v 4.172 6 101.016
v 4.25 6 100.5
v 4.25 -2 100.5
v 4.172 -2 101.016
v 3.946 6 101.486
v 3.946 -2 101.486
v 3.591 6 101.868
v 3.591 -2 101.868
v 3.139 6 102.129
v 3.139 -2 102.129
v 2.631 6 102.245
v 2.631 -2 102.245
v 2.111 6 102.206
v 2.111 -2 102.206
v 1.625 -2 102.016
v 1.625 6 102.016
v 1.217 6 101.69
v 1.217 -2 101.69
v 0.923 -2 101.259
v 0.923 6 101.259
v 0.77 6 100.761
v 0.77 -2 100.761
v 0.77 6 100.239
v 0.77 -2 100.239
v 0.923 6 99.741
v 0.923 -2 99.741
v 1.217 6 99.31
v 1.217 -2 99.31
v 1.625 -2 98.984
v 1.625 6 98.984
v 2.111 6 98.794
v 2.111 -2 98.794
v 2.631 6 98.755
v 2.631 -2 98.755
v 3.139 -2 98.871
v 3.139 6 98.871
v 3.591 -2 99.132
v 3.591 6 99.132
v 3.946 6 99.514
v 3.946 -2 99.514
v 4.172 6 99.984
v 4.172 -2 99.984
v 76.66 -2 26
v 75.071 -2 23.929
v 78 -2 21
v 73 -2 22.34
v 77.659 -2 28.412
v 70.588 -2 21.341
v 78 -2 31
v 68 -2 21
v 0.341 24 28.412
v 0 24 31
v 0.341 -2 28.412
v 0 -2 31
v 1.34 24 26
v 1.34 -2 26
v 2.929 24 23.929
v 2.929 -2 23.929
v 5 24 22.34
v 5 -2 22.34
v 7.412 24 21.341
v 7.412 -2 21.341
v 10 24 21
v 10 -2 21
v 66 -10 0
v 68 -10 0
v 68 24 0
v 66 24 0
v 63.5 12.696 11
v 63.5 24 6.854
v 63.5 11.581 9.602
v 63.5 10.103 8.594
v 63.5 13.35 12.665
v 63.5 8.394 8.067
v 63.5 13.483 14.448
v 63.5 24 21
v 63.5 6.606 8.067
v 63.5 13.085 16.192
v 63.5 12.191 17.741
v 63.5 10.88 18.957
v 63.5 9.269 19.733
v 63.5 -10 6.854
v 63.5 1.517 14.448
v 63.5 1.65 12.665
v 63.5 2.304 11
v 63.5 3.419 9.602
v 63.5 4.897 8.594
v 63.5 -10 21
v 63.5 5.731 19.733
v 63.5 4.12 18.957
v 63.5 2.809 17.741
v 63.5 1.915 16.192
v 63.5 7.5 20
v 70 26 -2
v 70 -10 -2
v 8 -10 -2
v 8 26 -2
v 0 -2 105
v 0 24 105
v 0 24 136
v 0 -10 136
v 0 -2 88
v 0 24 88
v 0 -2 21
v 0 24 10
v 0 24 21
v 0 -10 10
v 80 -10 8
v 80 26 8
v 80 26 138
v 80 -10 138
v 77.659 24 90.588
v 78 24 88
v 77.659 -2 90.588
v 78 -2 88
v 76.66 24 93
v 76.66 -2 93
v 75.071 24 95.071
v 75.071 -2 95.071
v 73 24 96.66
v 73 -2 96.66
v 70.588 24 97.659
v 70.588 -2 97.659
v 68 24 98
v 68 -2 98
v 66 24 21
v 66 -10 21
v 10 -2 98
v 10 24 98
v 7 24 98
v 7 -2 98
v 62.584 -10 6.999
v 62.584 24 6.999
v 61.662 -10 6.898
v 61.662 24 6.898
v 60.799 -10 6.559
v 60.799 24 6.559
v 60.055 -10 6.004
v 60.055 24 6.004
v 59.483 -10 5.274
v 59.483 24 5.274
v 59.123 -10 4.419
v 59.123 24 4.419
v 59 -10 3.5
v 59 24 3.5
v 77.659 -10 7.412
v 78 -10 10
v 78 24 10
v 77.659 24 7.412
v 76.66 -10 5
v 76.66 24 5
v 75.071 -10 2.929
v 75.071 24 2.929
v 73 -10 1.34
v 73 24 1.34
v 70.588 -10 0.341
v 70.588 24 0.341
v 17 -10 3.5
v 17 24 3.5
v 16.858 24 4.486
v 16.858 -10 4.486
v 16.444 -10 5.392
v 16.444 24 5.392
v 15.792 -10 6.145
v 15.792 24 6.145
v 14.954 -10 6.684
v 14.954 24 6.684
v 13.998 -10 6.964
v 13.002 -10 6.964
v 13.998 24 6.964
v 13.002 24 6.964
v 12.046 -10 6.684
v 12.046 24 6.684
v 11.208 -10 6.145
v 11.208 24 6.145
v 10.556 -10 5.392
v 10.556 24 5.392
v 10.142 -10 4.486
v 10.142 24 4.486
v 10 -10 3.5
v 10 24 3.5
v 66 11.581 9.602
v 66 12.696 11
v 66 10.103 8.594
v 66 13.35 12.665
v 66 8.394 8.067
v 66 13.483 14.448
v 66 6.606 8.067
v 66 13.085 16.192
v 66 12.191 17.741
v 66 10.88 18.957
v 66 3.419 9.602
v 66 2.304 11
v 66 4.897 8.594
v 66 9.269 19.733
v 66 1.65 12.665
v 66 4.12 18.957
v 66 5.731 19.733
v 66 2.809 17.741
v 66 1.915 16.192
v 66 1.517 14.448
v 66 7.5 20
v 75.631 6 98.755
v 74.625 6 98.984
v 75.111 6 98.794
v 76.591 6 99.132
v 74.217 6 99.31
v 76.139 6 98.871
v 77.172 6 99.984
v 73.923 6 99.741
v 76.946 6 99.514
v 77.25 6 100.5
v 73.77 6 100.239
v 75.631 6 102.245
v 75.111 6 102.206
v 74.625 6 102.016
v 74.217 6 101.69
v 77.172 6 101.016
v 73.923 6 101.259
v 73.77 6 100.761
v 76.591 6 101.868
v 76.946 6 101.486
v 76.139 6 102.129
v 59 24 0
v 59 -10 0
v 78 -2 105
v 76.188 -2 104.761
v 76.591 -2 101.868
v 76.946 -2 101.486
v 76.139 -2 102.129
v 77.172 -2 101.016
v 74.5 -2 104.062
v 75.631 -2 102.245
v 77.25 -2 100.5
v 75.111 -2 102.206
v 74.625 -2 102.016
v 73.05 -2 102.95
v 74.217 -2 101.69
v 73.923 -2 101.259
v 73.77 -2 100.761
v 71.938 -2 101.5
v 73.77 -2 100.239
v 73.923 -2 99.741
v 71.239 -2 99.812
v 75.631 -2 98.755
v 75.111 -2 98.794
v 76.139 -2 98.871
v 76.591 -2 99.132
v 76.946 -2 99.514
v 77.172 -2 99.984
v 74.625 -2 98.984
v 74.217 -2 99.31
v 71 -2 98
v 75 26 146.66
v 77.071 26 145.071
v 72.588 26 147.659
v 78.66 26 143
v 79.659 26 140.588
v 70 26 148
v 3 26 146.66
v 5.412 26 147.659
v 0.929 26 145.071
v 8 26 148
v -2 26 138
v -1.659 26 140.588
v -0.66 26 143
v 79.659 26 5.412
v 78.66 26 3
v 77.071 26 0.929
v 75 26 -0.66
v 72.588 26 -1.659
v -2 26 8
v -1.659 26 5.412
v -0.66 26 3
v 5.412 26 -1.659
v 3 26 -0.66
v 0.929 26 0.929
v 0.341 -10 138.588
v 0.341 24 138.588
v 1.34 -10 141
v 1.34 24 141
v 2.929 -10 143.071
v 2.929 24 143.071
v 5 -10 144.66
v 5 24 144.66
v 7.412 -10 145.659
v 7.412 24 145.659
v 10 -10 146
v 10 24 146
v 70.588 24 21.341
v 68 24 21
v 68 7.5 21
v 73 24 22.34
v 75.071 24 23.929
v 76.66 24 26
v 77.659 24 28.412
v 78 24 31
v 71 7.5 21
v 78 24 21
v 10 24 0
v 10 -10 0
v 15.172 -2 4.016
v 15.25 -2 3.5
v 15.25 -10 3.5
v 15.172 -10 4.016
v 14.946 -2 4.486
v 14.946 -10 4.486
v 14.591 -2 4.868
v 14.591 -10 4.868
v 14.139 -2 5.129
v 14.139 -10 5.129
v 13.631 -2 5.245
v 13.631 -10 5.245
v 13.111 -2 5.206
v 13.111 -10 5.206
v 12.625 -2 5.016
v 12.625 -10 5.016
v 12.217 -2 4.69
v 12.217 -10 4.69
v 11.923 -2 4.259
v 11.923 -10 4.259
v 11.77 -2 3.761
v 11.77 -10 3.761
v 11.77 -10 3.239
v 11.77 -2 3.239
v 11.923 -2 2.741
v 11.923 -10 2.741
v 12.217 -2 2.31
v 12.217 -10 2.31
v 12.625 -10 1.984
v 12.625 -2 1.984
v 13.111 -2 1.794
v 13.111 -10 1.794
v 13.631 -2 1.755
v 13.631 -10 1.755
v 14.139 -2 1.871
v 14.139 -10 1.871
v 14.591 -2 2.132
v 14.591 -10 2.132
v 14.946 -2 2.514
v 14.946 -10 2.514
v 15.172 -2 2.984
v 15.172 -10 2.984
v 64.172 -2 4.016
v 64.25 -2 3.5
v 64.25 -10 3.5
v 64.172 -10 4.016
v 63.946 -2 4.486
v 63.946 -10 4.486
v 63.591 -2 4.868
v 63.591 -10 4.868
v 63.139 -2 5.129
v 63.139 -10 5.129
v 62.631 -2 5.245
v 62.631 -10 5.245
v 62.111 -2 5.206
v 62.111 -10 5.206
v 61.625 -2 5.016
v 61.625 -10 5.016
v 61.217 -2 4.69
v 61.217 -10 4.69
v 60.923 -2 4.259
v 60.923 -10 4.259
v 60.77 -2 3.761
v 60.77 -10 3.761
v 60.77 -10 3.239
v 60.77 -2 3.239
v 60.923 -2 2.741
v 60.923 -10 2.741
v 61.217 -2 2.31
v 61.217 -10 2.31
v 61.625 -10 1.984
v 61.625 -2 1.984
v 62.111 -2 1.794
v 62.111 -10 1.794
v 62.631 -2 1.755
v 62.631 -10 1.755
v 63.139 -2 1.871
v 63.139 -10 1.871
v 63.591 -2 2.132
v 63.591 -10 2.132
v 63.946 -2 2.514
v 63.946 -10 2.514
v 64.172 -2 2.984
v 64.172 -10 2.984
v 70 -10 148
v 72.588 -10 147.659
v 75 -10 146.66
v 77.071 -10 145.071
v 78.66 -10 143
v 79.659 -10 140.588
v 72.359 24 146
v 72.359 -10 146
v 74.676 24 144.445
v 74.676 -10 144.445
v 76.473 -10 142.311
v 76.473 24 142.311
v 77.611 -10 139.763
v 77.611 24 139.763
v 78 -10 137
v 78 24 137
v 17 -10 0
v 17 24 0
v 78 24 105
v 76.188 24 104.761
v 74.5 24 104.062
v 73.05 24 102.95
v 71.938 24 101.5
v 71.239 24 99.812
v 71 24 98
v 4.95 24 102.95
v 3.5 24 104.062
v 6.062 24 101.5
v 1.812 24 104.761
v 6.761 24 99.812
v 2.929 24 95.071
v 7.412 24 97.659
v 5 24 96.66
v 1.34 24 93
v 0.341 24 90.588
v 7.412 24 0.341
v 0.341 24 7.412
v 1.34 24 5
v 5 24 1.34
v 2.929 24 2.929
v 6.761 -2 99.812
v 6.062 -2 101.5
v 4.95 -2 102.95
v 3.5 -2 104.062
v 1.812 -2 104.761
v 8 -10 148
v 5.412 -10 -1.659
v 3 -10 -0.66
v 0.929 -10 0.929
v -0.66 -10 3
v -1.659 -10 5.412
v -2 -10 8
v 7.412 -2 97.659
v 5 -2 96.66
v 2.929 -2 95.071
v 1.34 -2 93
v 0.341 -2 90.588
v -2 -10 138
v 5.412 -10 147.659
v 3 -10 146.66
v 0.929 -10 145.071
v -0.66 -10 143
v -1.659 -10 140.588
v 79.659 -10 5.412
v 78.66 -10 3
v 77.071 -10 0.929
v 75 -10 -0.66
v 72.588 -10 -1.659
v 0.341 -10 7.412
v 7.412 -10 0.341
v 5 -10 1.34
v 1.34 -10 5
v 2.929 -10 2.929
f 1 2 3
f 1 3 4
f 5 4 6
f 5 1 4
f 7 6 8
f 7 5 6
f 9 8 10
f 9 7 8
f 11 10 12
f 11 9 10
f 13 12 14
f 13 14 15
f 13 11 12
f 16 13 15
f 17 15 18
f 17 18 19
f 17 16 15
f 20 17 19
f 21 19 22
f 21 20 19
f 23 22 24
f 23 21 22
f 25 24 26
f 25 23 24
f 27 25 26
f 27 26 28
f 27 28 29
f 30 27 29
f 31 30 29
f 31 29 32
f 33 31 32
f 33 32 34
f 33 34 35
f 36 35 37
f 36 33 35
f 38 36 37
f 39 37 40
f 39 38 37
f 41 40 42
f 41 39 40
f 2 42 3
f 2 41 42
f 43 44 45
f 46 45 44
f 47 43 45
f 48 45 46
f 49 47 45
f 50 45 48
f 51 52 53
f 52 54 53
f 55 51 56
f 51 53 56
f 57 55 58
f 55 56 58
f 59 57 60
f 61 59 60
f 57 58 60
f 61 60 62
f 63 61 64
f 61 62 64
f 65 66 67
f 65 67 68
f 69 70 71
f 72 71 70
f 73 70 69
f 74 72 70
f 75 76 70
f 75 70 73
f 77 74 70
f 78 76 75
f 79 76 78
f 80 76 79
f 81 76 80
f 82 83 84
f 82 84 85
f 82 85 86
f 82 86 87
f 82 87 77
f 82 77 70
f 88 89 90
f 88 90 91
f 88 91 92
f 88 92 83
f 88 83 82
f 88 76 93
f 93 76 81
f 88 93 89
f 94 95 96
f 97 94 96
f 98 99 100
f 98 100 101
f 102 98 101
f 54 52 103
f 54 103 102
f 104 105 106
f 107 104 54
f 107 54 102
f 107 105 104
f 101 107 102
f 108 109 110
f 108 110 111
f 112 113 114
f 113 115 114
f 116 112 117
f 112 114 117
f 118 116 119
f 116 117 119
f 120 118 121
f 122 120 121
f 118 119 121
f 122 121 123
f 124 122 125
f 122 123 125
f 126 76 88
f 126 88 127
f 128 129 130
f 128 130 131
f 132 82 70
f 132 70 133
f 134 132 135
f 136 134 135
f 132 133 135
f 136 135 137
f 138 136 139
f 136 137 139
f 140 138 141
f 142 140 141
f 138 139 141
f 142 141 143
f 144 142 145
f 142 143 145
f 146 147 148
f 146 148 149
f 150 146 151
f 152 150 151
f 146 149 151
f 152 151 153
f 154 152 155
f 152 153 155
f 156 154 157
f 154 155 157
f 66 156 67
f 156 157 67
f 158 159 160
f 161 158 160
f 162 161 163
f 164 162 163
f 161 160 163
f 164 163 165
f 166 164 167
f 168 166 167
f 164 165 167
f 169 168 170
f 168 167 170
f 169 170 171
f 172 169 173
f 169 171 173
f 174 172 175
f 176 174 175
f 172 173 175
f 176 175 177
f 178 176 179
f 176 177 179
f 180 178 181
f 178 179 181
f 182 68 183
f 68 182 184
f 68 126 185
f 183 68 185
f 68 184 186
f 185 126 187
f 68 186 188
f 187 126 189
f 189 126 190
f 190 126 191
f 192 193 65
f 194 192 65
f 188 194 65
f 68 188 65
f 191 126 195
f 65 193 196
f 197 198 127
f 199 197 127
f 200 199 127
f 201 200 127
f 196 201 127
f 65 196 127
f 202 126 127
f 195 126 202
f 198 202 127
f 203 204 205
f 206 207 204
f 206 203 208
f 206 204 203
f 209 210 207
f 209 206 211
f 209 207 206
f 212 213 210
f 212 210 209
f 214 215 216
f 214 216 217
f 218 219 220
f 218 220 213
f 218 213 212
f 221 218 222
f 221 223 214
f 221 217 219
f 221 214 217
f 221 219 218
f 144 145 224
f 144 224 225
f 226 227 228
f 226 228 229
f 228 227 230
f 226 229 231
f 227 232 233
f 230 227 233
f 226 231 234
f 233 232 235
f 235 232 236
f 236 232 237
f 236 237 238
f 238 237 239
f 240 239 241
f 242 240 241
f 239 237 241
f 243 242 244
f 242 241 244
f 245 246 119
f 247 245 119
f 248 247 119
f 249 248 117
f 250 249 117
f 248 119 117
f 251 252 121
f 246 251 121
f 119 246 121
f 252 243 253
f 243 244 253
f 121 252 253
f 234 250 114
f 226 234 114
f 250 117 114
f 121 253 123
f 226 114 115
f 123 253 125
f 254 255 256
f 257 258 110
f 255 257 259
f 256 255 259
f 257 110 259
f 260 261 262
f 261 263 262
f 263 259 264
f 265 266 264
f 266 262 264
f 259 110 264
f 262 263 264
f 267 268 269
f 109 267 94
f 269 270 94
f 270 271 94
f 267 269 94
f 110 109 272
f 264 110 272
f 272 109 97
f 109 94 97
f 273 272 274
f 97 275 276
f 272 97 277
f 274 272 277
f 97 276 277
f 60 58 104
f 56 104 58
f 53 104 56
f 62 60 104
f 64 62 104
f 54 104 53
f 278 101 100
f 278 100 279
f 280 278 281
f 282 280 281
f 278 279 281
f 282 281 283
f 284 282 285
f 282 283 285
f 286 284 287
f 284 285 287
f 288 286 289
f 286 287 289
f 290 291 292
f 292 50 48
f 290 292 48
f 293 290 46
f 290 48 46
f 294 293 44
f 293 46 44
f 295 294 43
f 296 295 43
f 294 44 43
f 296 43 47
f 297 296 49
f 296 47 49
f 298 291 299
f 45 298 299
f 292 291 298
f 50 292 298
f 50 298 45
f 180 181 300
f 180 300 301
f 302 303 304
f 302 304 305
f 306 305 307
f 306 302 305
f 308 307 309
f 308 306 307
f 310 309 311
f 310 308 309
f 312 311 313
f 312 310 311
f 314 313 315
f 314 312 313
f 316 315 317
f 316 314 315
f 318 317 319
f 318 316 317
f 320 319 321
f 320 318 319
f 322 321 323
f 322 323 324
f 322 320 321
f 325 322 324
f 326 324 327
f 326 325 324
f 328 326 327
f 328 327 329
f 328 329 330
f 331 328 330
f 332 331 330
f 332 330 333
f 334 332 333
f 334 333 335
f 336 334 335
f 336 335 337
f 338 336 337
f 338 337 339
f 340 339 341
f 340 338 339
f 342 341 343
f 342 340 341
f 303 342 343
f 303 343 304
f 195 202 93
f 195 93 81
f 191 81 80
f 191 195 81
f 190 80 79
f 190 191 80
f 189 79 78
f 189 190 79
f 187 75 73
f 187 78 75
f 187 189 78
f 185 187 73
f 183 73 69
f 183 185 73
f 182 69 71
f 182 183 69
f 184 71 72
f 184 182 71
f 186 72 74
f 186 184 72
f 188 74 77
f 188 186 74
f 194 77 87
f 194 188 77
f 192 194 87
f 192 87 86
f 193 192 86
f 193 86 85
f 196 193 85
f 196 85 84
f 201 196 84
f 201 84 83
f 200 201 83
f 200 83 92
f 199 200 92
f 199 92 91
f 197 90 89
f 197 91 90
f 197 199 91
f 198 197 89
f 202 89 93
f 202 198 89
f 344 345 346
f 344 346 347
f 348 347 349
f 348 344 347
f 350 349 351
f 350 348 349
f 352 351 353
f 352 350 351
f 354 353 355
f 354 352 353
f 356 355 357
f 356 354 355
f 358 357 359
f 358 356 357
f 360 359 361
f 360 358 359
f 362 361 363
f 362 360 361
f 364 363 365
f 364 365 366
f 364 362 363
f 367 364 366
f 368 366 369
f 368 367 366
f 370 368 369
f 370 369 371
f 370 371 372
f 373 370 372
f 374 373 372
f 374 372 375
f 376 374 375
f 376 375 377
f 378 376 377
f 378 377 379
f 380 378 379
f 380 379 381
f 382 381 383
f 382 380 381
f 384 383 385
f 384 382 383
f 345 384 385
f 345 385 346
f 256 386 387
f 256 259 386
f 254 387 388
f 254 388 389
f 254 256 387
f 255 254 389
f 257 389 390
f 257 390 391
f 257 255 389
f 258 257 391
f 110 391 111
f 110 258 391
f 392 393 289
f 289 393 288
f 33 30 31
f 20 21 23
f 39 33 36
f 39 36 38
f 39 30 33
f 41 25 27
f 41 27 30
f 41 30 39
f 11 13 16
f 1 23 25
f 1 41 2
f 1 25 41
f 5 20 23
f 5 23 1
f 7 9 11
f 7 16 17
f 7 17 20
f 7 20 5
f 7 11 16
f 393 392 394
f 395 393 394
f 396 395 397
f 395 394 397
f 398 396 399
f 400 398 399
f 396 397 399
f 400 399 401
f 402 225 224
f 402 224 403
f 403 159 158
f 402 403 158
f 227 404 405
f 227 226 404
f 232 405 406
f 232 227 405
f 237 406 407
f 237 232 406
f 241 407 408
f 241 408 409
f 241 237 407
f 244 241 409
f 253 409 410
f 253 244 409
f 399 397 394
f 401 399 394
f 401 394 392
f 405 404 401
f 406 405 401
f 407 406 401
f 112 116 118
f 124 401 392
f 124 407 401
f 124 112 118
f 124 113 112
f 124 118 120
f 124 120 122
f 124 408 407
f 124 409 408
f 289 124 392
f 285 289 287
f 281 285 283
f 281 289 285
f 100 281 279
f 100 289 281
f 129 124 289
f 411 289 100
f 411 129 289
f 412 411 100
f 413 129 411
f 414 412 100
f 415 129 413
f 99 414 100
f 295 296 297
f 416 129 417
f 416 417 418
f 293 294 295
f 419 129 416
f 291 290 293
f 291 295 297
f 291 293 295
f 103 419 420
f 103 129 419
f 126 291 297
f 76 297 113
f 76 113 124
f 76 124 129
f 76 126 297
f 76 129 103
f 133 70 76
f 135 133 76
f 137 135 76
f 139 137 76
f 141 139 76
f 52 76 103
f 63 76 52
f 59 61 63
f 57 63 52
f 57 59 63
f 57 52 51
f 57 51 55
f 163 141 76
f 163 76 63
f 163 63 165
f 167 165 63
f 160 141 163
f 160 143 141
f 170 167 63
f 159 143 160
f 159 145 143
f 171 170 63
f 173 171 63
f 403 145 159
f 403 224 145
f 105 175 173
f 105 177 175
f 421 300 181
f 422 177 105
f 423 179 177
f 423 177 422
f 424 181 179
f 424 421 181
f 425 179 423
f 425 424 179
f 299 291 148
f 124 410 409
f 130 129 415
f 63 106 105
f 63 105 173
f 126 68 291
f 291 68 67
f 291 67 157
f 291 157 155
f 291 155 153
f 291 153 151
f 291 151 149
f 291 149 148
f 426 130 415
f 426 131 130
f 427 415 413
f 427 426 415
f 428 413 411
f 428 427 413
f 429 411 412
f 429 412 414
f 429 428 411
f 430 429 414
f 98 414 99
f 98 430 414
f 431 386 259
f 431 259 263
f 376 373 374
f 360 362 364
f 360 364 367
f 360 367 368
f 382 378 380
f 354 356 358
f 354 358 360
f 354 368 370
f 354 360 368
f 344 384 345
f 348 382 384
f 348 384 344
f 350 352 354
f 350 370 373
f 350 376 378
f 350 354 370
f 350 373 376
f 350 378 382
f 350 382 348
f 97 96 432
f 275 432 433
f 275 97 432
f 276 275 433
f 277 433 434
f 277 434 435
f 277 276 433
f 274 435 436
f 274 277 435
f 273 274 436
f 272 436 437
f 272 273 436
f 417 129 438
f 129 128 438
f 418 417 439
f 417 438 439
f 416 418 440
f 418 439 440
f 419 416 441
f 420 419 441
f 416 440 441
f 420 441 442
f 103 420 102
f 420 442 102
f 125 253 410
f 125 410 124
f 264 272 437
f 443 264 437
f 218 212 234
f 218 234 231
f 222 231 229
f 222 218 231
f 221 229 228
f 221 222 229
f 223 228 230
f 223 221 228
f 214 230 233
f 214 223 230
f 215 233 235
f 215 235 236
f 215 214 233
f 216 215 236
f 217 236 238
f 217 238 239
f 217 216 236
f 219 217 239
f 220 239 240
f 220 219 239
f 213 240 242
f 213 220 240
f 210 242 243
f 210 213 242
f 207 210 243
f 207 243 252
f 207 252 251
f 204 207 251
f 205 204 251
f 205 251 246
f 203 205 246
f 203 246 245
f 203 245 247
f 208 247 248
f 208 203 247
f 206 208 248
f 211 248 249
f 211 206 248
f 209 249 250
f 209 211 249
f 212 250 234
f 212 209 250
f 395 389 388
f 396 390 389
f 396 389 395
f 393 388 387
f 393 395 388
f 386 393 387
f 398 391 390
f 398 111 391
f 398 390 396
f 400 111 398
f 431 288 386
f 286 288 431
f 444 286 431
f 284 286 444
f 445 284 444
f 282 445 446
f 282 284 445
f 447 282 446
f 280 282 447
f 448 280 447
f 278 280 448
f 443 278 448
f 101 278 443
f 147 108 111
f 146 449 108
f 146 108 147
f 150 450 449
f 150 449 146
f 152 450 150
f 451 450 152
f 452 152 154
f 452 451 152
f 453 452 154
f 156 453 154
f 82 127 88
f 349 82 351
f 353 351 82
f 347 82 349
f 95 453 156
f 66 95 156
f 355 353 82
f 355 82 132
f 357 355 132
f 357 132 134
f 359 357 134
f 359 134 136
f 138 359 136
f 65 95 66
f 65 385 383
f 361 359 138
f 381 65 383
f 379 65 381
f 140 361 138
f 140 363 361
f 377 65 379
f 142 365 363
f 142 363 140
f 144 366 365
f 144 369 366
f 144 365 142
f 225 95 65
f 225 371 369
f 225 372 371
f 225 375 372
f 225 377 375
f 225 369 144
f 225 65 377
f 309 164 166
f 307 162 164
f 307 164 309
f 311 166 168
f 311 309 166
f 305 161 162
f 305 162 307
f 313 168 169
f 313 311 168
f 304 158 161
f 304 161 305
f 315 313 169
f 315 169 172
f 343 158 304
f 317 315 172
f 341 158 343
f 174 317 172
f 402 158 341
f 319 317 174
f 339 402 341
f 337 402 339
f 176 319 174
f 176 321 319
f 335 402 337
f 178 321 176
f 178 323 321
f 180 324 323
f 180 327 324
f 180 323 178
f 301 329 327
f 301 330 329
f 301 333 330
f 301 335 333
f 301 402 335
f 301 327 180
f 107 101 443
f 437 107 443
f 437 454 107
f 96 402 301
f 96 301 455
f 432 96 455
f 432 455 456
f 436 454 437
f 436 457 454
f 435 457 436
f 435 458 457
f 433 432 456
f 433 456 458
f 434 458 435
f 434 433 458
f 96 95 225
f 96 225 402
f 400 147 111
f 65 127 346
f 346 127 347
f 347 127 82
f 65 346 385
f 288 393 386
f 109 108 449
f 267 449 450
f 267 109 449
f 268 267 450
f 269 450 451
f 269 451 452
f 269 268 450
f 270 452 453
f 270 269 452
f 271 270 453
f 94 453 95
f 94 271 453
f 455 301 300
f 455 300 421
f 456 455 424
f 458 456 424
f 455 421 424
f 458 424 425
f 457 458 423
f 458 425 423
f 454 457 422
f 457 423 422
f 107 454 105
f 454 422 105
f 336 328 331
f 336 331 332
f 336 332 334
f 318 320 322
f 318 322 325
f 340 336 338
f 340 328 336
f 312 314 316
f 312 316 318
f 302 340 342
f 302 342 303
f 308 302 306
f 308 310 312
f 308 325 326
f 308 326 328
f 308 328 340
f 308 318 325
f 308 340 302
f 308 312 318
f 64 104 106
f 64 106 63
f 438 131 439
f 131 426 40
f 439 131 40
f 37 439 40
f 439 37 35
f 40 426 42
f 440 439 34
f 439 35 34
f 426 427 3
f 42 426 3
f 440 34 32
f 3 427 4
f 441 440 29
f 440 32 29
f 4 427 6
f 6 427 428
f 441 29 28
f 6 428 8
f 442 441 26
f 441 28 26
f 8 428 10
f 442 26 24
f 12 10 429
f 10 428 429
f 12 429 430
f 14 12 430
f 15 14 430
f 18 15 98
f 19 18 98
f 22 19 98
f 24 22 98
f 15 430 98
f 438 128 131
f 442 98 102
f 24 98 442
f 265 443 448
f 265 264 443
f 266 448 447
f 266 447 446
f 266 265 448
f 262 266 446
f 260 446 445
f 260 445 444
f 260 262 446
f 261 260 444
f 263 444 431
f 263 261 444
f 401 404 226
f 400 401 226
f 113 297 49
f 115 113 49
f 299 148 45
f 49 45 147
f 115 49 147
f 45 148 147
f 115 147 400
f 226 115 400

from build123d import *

# Parameters (mm, degrees)
CYLINDER030_R             = 1.75
CYLINDER030_DEPTH         = 8
CYLINDER029_R             = 1.75
CYLINDER029_DEPTH         = 8
CYLINDER027_W             = 7
CYLINDER027_H             = 26
CYLINDER027_ANGLE         = 90
CYLINDER028_W             = 7
CYLINDER028_H             = 26
CYLINDER028_ANGLE         = 90
CYLINDER022_R             = 1.75
CYLINDER022_DEPTH         = 8
CYLINDER026_R             = 7
CYLINDER026_DEPTH         = 5
CYLINDER025_R             = 6
CYLINDER025_DEPTH         = 20
FUSION007_PLACEMENT_ANGLE = 270
CYLINDER024_R             = 1.75
CYLINDER024_DEPTH         = 8
CYLINDER023_R             = 3.5
CYLINDER023_DEPTH         = 34
BOX022_W                  = 7
BOX022_H                  = 34
BOX022_DEPTH              = 3.5
BOX023_W                  = 7
BOX023_H                  = 34
BOX023_DEPTH              = 3.5
BOX024_W                  = 2.5
BOX024_H                  = 34
BOX024_DEPTH              = 17.5
CYLINDER017_W             = 10
CYLINDER017_H             = 26
CYLINDER017_ANGLE         = 90
BOX018_W                  = 10
BOX018_H                  = 26
BOX018_DEPTH              = 10
CUT018_PLACEMENT_ANGLE    = 180
CYLINDER018_W             = 10
CYLINDER018_H             = 26
CYLINDER018_ANGLE         = 90
BOX019_W                  = 10
BOX019_H                  = 26
BOX019_DEPTH              = 10
CUT019_PLACEMENT_ANGLE    = 270
CYLINDER019_W             = 10
CYLINDER019_H             = 26
CYLINDER019_ANGLE         = 90
BOX020_W                  = 10
BOX020_H                  = 26
BOX020_DEPTH              = 10
CYLINDER020_W             = 10
CYLINDER020_H             = 26
CYLINDER020_ANGLE         = 90
BOX021_W                  = 10
BOX021_H                  = 26
BOX021_DEPTH              = 10
CUT021_PLACEMENT_ANGLE    = 270
CYLINDER014_W             = 10
CYLINDER014_H             = 34
CYLINDER014_ANGLE         = 90
BOX015_W                  = 10
BOX015_H                  = 34
BOX015_DEPTH              = 10
CUT013_PLACEMENT_ANGLE    = 180
CYLINDER015_W             = 10
CYLINDER015_H             = 34
CYLINDER015_ANGLE         = 90
BOX016_W                  = 10
BOX016_H                  = 34
BOX016_DEPTH              = 10
CUT014_PLACEMENT_ANGLE    = 180
CYLINDER016_W             = 10
CYLINDER016_H             = 34
CYLINDER016_ANGLE         = 90
BOX017_W                  = 10
BOX017_H                  = 34
BOX017_DEPTH              = 10
CUT015_PITCH_ANGLE        = -90
CUT015_PLACEMENT_ANGLE    = 180
CYLINDER013_W             = 10
CYLINDER013_H             = 34
CYLINDER013_ANGLE         = 90
BOX013_W                  = 10
BOX013_H                  = 34
BOX013_DEPTH              = 10
CUT012_PITCH_ANGLE        = 90
CUT012_PLACEMENT_ANGLE    = -180
BOX014_W                  = 78
BOX014_H                  = 34
BOX014_DEPTH              = 146
CYLINDER009_W             = 10
CYLINDER009_H             = 36
CYLINDER009_ANGLE         = 90
BOX009_W                  = 10
BOX009_H                  = 36
BOX009_DEPTH              = 10
CUT007_PLACEMENT_ANGLE    = 180
CYLINDER010_W             = 10
CYLINDER010_H             = 36
CYLINDER010_ANGLE         = 90
BOX010_W                  = 10
BOX010_H                  = 36
BOX010_DEPTH              = 10
CUT008_PLACEMENT_ANGLE    = 180
CYLINDER011_W             = 10
CYLINDER011_H             = 36
CYLINDER011_ANGLE         = 90
BOX011_W                  = 10
BOX011_H                  = 36
BOX011_DEPTH              = 10
CUT009_PITCH_ANGLE        = -90
CUT009_PLACEMENT_ANGLE    = -180
CYLINDER008_W             = 10
CYLINDER008_H             = 36
CYLINDER008_ANGLE         = 90
BOX007_W                  = 10
BOX007_H                  = 36
BOX007_DEPTH              = 10
CUT006_PITCH_ANGLE        = 90
CUT006_PLACEMENT_ANGLE    = -180
BOX008_W                  = 82
BOX008_H                  = 36
BOX008_DEPTH              = 150
CYLINDER021_R             = 3.5
CYLINDER021_DEPTH         = 34


with BuildPart() as cylinder030:
    # Cylinder030 → Cylinder030 (new body)
    with BuildSketch(Plane(origin=(75.5, -2, 100.5), x_dir=(1, 0, 0), z_dir=(0, -1, 0))):
        Circle(CYLINDER030_R)
    extrude(amount=CYLINDER030_DEPTH)


with BuildPart() as basecuts001:
    # Cylinder029 → Cylinder029 (new body)
    with BuildSketch(Plane(origin=(2.5, -2, 100.5), x_dir=(1, 0, 0), z_dir=(0, -1, 0))):
        Circle(CYLINDER029_R)
    extrude(amount=CYLINDER029_DEPTH)

    # Fusion011: union Cylinder030
    add(cylinder030.part)


with BuildPart() as basecuts001_1:
    # Fusion011 placement: moved
    add(basecuts001.part.moved(Location((0, 8, 0))))


with BuildPart() as mainmounts:
    # Cylinder027 → Cylinder027 (revolve)
    with BuildSketch(Plane(origin=(0, 24, 98), x_dir=(1, 0, 0), z_dir=(0, 0, -1))):
        with Locations((3.5, 13)):
            Rectangle(CYLINDER027_W, CYLINDER027_H)
    revolve(axis=Axis((0, 24, 98), (0, -1, 0)), revolution_arc=CYLINDER027_ANGLE)


with BuildPart() as fusion012:
    # Cylinder028 → Cylinder028 (revolve)
    with BuildSketch(Plane(origin=(78, 24, 98), x_dir=(0, 0, 1), z_dir=(1, 0, 0))):
        with Locations((3.5, 13)):
            Rectangle(CYLINDER028_W, CYLINDER028_H)
    revolve(axis=Axis((78, 24, 98), (0, -1, 0)), revolution_arc=CYLINDER028_ANGLE)

    # Fusion012: union mainMounts
    add(mainmounts.part)


with BuildPart() as cylinder022:
    # Cylinder022 → Cylinder022 (new body)
    with BuildSketch(Plane(origin=(13.5, -2, 3.5), x_dir=(1, 0, 0), z_dir=(0, -1, 0))):
        Circle(CYLINDER022_R)
    extrude(amount=CYLINDER022_DEPTH)


with BuildPart() as cylinder026:
    # Cylinder026 → Cylinder026 (new body)
    with BuildSketch(Plane.XY):
        Circle(CYLINDER026_R)
    extrude(amount=CYLINDER026_DEPTH)


with BuildPart() as powerswitch:
    # Cylinder025 → Cylinder025 (new body)
    with BuildSketch(Plane.XY):
        Circle(CYLINDER025_R)
    extrude(amount=CYLINDER025_DEPTH)

    # Fusion007: union Cylinder026
    add(cylinder026.part)


with BuildPart() as powerswitch_1:
    # Fusion007 placement: moved
    add(powerswitch.part.moved(Location((71, 7.5, 14))).rotate(Axis((71, 7.5, 14), (0, 1, 0)), FUSION007_PLACEMENT_ANGLE))


with BuildPart() as basecuts:
    # Cylinder024 → Cylinder024 (new body)
    with BuildSketch(Plane(origin=(62.5, -2, 3.5), x_dir=(1, 0, 0), z_dir=(0, -1, 0))):
        Circle(CYLINDER024_R)
    extrude(amount=CYLINDER024_DEPTH)

    # Fusion010: union Cylinder022, powerSwitch
    add(cylinder022.part)
    add(powerswitch_1.part)


with BuildPart() as cylinder023:
    # Cylinder023 → Cylinder023 (new body)
    with BuildSketch(Plane(origin=(62.5, 24, 3.5), x_dir=(1, 0, 0), z_dir=(0, -1, 0))):
        Circle(CYLINDER023_R)
    extrude(amount=CYLINDER023_DEPTH)


with BuildPart() as cube017:
    # Box022 → Box022 (new body)
    with BuildSketch(Plane(origin=(10, 24, 3.5), x_dir=(1, 0, 0), z_dir=(0, 0, -1))):
        with Locations((3.5, 17)):
            Rectangle(BOX022_W, BOX022_H)
    extrude(amount=BOX022_DEPTH)


with BuildPart() as cube018:
    # Box023 → Box023 (new body)
    with BuildSketch(Plane(origin=(59, 24, 3.5), x_dir=(1, 0, 0), z_dir=(0, 0, -1))):
        with Locations((3.5, 17)):
            Rectangle(BOX023_W, BOX023_H)
    extrude(amount=BOX023_DEPTH)


with BuildPart() as cube019:
    # Box024 → Box024 (new body)
    with BuildSketch(Plane(origin=(63.5, 24, 21), x_dir=(1, 0, 0), z_dir=(0, 0, -1))):
        with Locations((1.25, 17)):
            Rectangle(BOX024_W, BOX024_H)
    extrude(amount=BOX024_DEPTH)


with BuildPart() as cylinder017:
    # Cylinder017 → Cylinder017 (revolve)
    with BuildSketch(Plane(origin=(0, 26, 0), x_dir=(1, 0, 0), z_dir=(0, 0, -1))):
        with Locations((5, 13)):
            Rectangle(CYLINDER017_W, CYLINDER017_H)
    revolve(axis=Axis((0, 26, 0), (0, -1, 0)), revolution_arc=CYLINDER017_ANGLE)


with BuildPart() as batterysupport:
    # Box018 → Box018 (new body)
    with BuildSketch(Plane(origin=(10, 26, 0), x_dir=(-1, 0, 0), z_dir=(0, 0, 1))):
        with Locations((5, 13)):
            Rectangle(BOX018_W, BOX018_H)
    extrude(amount=BOX018_DEPTH)

    # Cut018: cut Cylinder017
    add(cylinder017.part, mode=Mode.SUBTRACT)


with BuildPart() as batterysupport_1:
    # Cut018 placement: moved
    add(batterysupport.part.moved(Location((10, -2, 31))).rotate(Axis((10, -2, 31), (0, 1, 0)), CUT018_PLACEMENT_ANGLE))


with BuildPart() as cylinder018:
    # Cylinder018 → Cylinder018 (revolve)
    with BuildSketch(Plane(origin=(0, 26, 0), x_dir=(1, 0, 0), z_dir=(0, 0, -1))):
        with Locations((5, 13)):
            Rectangle(CYLINDER018_W, CYLINDER018_H)
    revolve(axis=Axis((0, 26, 0), (0, -1, 0)), revolution_arc=CYLINDER018_ANGLE)


with BuildPart() as batterysupport001:
    # Box019 → Box019 (new body)
    with BuildSketch(Plane(origin=(10, 26, 0), x_dir=(-1, 0, 0), z_dir=(0, 0, 1))):
        with Locations((5, 13)):
            Rectangle(BOX019_W, BOX019_H)
    extrude(amount=BOX019_DEPTH)

    # Cut019: cut Cylinder018
    add(cylinder018.part, mode=Mode.SUBTRACT)


with BuildPart() as batterysupport001_1:
    # Cut019 placement: moved
    add(batterysupport001.part.moved(Location((68, -2, 31))).rotate(Axis((68, -2, 31), (0, -1, 0)), CUT019_PLACEMENT_ANGLE))


with BuildPart() as cylinder019:
    # Cylinder019 → Cylinder019 (revolve)
    with BuildSketch(Plane(origin=(0, 26, 0), x_dir=(1, 0, 0), z_dir=(0, 0, -1))):
        with Locations((5, 13)):
            Rectangle(CYLINDER019_W, CYLINDER019_H)
    revolve(axis=Axis((0, 26, 0), (0, -1, 0)), revolution_arc=CYLINDER019_ANGLE)


with BuildPart() as batterysupport002:
    # Box020 → Box020 (new body)
    with BuildSketch(Plane(origin=(10, 26, 0), x_dir=(-1, 0, 0), z_dir=(0, 0, 1))):
        with Locations((5, 13)):
            Rectangle(BOX020_W, BOX020_H)
    extrude(amount=BOX020_DEPTH)

    # Cut020: cut Cylinder019
    add(cylinder019.part, mode=Mode.SUBTRACT)


with BuildPart() as batterysupport002_1:
    # Cut020 placement: moved
    add(batterysupport002.part.moved(Location((68, -2, 88))))


with BuildPart() as cylinder020:
    # Cylinder020 → Cylinder020 (revolve)
    with BuildSketch(Plane(origin=(0, 26, 0), x_dir=(1, 0, 0), z_dir=(0, 0, -1))):
        with Locations((5, 13)):
            Rectangle(CYLINDER020_W, CYLINDER020_H)
    revolve(axis=Axis((0, 26, 0), (0, -1, 0)), revolution_arc=CYLINDER020_ANGLE)


with BuildPart() as batterysupport003:
    # Box021 → Box021 (new body)
    with BuildSketch(Plane(origin=(10, 26, 0), x_dir=(-1, 0, 0), z_dir=(0, 0, 1))):
        with Locations((5, 13)):
            Rectangle(BOX021_W, BOX021_H)
    extrude(amount=BOX021_DEPTH)

    # Cut021: cut Cylinder020
    add(cylinder020.part, mode=Mode.SUBTRACT)


with BuildPart() as batterysupport003_1:
    # Cut021 placement: moved
    add(batterysupport003.part.moved(Location((10, -2, 88))).rotate(Axis((10, -2, 88), (0, 1, 0)), CUT021_PLACEMENT_ANGLE))


with BuildPart() as cylinder014:
    # Cylinder014 → Cylinder014 (revolve)
    with BuildSketch(Plane(origin=(0, 26, 0), x_dir=(1, 0, 0), z_dir=(0, 0, -1))):
        with Locations((5, 17)):
            Rectangle(CYLINDER014_W, CYLINDER014_H)
    revolve(axis=Axis((0, 26, 0), (0, -1, 0)), revolution_arc=CYLINDER014_ANGLE)


with BuildPart() as cut013:
    # Box015 → Box015 (new body)
    with BuildSketch(Plane(origin=(0, -8, 0), x_dir=(1, 0, 0), z_dir=(0, 0, 1))):
        with Locations((5, 17)):
            Rectangle(BOX015_W, BOX015_H)
    extrude(amount=BOX015_DEPTH)

    # Cut013: cut Cylinder014
    add(cylinder014.part, mode=Mode.SUBTRACT)


with BuildPart() as cut013_1:
    # Cut013 placement: moved
    add(cut013.part.moved(Location((70, 18, 8))).rotate(Axis((70, 18, 8), (1, 0, 0)), CUT013_PLACEMENT_ANGLE))


with BuildPart() as cylinder015:
    # Cylinder015 → Cylinder015 (revolve)
    with BuildSketch(Plane(origin=(0, 26, 0), x_dir=(1, 0, 0), z_dir=(0, 0, -1))):
        with Locations((5, 17)):
            Rectangle(CYLINDER015_W, CYLINDER015_H)
    revolve(axis=Axis((0, 26, 0), (0, -1, 0)), revolution_arc=CYLINDER015_ANGLE)


with BuildPart() as cut014:
    # Box016 → Box016 (new body)
    with BuildSketch(Plane(origin=(0, -8, 0), x_dir=(1, 0, 0), z_dir=(0, 0, 1))):
        with Locations((5, 17)):
            Rectangle(BOX016_W, BOX016_H)
    extrude(amount=BOX016_DEPTH)

    # Cut014: cut Cylinder015
    add(cylinder015.part, mode=Mode.SUBTRACT)


with BuildPart() as cut014_1:
    # Cut014 placement: moved
    add(cut014.part.moved(Location((12, 18, 134))).rotate(Axis((12, 18, 134), (0, 0, 1)), CUT014_PLACEMENT_ANGLE))


with BuildPart() as cylinder016:
    # Cylinder016 → Cylinder016 (revolve)
    with BuildSketch(Plane(origin=(0, 26, 0), x_dir=(1, 0, 0), z_dir=(0, 0, -1))):
        with Locations((5, 17)):
            Rectangle(CYLINDER016_W, CYLINDER016_H)
    revolve(axis=Axis((0, 26, 0), (0, -1, 0)), revolution_arc=CYLINDER016_ANGLE)


with BuildPart() as cut015:
    # Box017 → Box017 (new body)
    with BuildSketch(Plane(origin=(0, -8, 0), x_dir=(1, 0, 0), z_dir=(0, 0, 1))):
        with Locations((5, 17)):
            Rectangle(BOX017_W, BOX017_H)
    extrude(amount=BOX017_DEPTH)

    # Cut015: cut Cylinder016
    add(cylinder016.part, mode=Mode.SUBTRACT)


with BuildPart() as cut015_1:
    # Cut015 pitch: moved
    add(cut015.part.rotate(Axis((0, 0, 0), (0, 1, 0)), CUT015_PITCH_ANGLE))


with BuildPart() as cut015_2:
    # Cut015 placement: moved
    add(cut015_1.part.moved(Location((70, 18, 135))).rotate(Axis((70, 18, 135), (0, 0, 1)), CUT015_PLACEMENT_ANGLE))


with BuildPart() as cylinder013:
    # Cylinder013 → Cylinder013 (revolve)
    with BuildSketch(Plane(origin=(0, 26, 0), x_dir=(1, 0, 0), z_dir=(0, 0, -1))):
        with Locations((5, 17)):
            Rectangle(CYLINDER013_W, CYLINDER013_H)
    revolve(axis=Axis((0, 26, 0), (0, -1, 0)), revolution_arc=CYLINDER013_ANGLE)


with BuildPart() as fusion006:
    # Box013 → Box013 (new body)
    with BuildSketch(Plane(origin=(0, -8, 0), x_dir=(1, 0, 0), z_dir=(0, 0, 1))):
        with Locations((5, 17)):
            Rectangle(BOX013_W, BOX013_H)
    extrude(amount=BOX013_DEPTH)

    # Cut012: cut Cylinder013
    add(cylinder013.part, mode=Mode.SUBTRACT)


with BuildPart() as fusion006_1:
    # Cut012 pitch: moved
    add(fusion006.part.rotate(Axis((0, 0, 0), (0, 1, 0)), CUT012_PITCH_ANGLE))


with BuildPart() as fusion006_2:
    # Cut012 placement: moved
    add(fusion006_1.part.moved(Location((12, 18, 8))).rotate(Axis((12, 18, 8), (0, 0, 1)), CUT012_PLACEMENT_ANGLE))

    # Fusion006: union Cut013, Cut014, Cut015
    add(cut013_1.part)
    add(cut014_1.part)
    add(cut015_2.part)


with BuildPart() as baseout001:
    # Box014 → Box014 (new body)
    with BuildSketch(Plane(origin=(80, 26, -2), x_dir=(-1, 0, 0), z_dir=(0, 0, 1))):
        with Locations((39, 17)):
            Rectangle(BOX014_W, BOX014_H)
    extrude(amount=BOX014_DEPTH)

    # Cut016: cut Fusion006
    add(fusion006_2.part, mode=Mode.SUBTRACT)


with BuildPart() as baseout001_1:
    # Cut016 placement: moved
    add(baseout001.part.moved(Location((-2, -2, 2))))


with BuildPart() as cylinder009:
    # Cylinder009 → Cylinder009 (revolve)
    with BuildSketch(Plane(origin=(0, 26, 0), x_dir=(1, 0, 0), z_dir=(0, 0, -1))):
        with Locations((5, 18)):
            Rectangle(CYLINDER009_W, CYLINDER009_H)
    revolve(axis=Axis((0, 26, 0), (0, -1, 0)), revolution_arc=CYLINDER009_ANGLE)


with BuildPart() as cut007:
    # Box009 → Box009 (new body)
    with BuildSketch(Plane(origin=(0, -10, 0), x_dir=(1, 0, 0), z_dir=(0, 0, 1))):
        with Locations((5, 18)):
            Rectangle(BOX009_W, BOX009_H)
    extrude(amount=BOX009_DEPTH)

    # Cut007: cut Cylinder009
    add(cylinder009.part, mode=Mode.SUBTRACT)


with BuildPart() as cut007_1:
    # Cut007 placement: moved
    add(cut007.part.moved(Location((70, 18, 8))).rotate(Axis((70, 18, 8), (1, 0, 0)), CUT007_PLACEMENT_ANGLE))


with BuildPart() as cylinder010:
    # Cylinder010 → Cylinder010 (revolve)
    with BuildSketch(Plane(origin=(0, 26, 0), x_dir=(1, 0, 0), z_dir=(0, 0, -1))):
        with Locations((5, 18)):
            Rectangle(CYLINDER010_W, CYLINDER010_H)
    revolve(axis=Axis((0, 26, 0), (0, -1, 0)), revolution_arc=CYLINDER010_ANGLE)


with BuildPart() as cut008:
    # Box010 → Box010 (new body)
    with BuildSketch(Plane(origin=(0, -10, 0), x_dir=(1, 0, 0), z_dir=(0, 0, 1))):
        with Locations((5, 18)):
            Rectangle(BOX010_W, BOX010_H)
    extrude(amount=BOX010_DEPTH)

    # Cut008: cut Cylinder010
    add(cylinder010.part, mode=Mode.SUBTRACT)


with BuildPart() as cut008_1:
    # Cut008 placement: moved
    add(cut008.part.moved(Location((8, 18, 138))).rotate(Axis((8, 18, 138), (0, 0, 1)), CUT008_PLACEMENT_ANGLE))


with BuildPart() as cylinder011:
    # Cylinder011 → Cylinder011 (revolve)
    with BuildSketch(Plane(origin=(0, 26, 0), x_dir=(1, 0, 0), z_dir=(0, 0, -1))):
        with Locations((5, 18)):
            Rectangle(CYLINDER011_W, CYLINDER011_H)
    revolve(axis=Axis((0, 26, 0), (0, -1, 0)), revolution_arc=CYLINDER011_ANGLE)


with BuildPart() as cut009:
    # Box011 → Box011 (new body)
    with BuildSketch(Plane(origin=(0, -10, 0), x_dir=(1, 0, 0), z_dir=(0, 0, 1))):
        with Locations((5, 18)):
            Rectangle(BOX011_W, BOX011_H)
    extrude(amount=BOX011_DEPTH)

    # Cut009: cut Cylinder011
    add(cylinder011.part, mode=Mode.SUBTRACT)


with BuildPart() as cut009_1:
    # Cut009 pitch: moved
    add(cut009.part.rotate(Axis((0, 0, 0), (0, 1, 0)), CUT009_PITCH_ANGLE))


with BuildPart() as cut009_2:
    # Cut009 placement: moved
    add(cut009_1.part.moved(Location((70, 18, 138))).rotate(Axis((70, 18, 138), (0, 0, 1)), CUT009_PLACEMENT_ANGLE))


with BuildPart() as cylinder008:
    # Cylinder008 → Cylinder008 (revolve)
    with BuildSketch(Plane(origin=(0, 26, 0), x_dir=(1, 0, 0), z_dir=(0, 0, -1))):
        with Locations((5, 18)):
            Rectangle(CYLINDER008_W, CYLINDER008_H)
    revolve(axis=Axis((0, 26, 0), (0, -1, 0)), revolution_arc=CYLINDER008_ANGLE)


with BuildPart() as fusion005:
    # Box007 → Box007 (new body)
    with BuildSketch(Plane(origin=(0, -10, 0), x_dir=(1, 0, 0), z_dir=(0, 0, 1))):
        with Locations((5, 18)):
            Rectangle(BOX007_W, BOX007_H)
    extrude(amount=BOX007_DEPTH)

    # Cut006: cut Cylinder008
    add(cylinder008.part, mode=Mode.SUBTRACT)


with BuildPart() as fusion005_1:
    # Cut006 pitch: moved
    add(fusion005.part.rotate(Axis((0, 0, 0), (0, 1, 0)), CUT006_PITCH_ANGLE))


with BuildPart() as fusion005_2:
    # Cut006 placement: moved
    add(fusion005_1.part.moved(Location((8, 18, 8))).rotate(Axis((8, 18, 8), (0, 0, 1)), CUT006_PLACEMENT_ANGLE))

    # Fusion005: union Cut007, Cut008, Cut009
    add(cut007_1.part)
    add(cut008_1.part)
    add(cut009_2.part)


with BuildPart() as fusion005_3:
    # Fusion005 placement: moved
    add(fusion005_2.part.moved(Location((0, -2, 0))))


with BuildPart() as base:
    # Box008 → Box008 (new body)
    with BuildSketch(Plane(origin=(80, 26, -2), x_dir=(-1, 0, 0), z_dir=(0, 0, 1))):
        with Locations((41, 18)):
            Rectangle(BOX008_W, BOX008_H)
    extrude(amount=BOX008_DEPTH)

    # Cut010: cut Fusion005
    add(fusion005_3.part, mode=Mode.SUBTRACT)

    # Cut017: cut BaseOut001
    add(baseout001_1.part, mode=Mode.SUBTRACT)

    # Fusion008: union batterySupport, batterySupport001, batterySupport002, batterySupport003
    add(batterysupport_1.part)
    add(batterysupport001_1.part)
    add(batterysupport002_1.part)
    add(batterysupport003_1.part)


with BuildPart() as basebottom:
    # Cylinder021 → Cylinder021 (new body)
    with BuildSketch(Plane(origin=(13.5, 24, 3.5), x_dir=(1, 0, 0), z_dir=(0, -1, 0))):
        Circle(CYLINDER021_R)
    extrude(amount=CYLINDER021_DEPTH)

    # Fusion009: union Cylinder023, Cube017, Cube018, Cube019, base
    add(cylinder023.part)
    add(cube017.part)
    add(cube018.part)
    add(cube019.part)
    add(base.part)

    # Cut022: cut baseCuts
    add(basecuts.part, mode=Mode.SUBTRACT)

    # Fusion013: union Fusion012
    add(fusion012.part)

    # Cut023: cut baseCuts001
    add(basecuts001_1.part, mode=Mode.SUBTRACT)


solid = basebottom.part
